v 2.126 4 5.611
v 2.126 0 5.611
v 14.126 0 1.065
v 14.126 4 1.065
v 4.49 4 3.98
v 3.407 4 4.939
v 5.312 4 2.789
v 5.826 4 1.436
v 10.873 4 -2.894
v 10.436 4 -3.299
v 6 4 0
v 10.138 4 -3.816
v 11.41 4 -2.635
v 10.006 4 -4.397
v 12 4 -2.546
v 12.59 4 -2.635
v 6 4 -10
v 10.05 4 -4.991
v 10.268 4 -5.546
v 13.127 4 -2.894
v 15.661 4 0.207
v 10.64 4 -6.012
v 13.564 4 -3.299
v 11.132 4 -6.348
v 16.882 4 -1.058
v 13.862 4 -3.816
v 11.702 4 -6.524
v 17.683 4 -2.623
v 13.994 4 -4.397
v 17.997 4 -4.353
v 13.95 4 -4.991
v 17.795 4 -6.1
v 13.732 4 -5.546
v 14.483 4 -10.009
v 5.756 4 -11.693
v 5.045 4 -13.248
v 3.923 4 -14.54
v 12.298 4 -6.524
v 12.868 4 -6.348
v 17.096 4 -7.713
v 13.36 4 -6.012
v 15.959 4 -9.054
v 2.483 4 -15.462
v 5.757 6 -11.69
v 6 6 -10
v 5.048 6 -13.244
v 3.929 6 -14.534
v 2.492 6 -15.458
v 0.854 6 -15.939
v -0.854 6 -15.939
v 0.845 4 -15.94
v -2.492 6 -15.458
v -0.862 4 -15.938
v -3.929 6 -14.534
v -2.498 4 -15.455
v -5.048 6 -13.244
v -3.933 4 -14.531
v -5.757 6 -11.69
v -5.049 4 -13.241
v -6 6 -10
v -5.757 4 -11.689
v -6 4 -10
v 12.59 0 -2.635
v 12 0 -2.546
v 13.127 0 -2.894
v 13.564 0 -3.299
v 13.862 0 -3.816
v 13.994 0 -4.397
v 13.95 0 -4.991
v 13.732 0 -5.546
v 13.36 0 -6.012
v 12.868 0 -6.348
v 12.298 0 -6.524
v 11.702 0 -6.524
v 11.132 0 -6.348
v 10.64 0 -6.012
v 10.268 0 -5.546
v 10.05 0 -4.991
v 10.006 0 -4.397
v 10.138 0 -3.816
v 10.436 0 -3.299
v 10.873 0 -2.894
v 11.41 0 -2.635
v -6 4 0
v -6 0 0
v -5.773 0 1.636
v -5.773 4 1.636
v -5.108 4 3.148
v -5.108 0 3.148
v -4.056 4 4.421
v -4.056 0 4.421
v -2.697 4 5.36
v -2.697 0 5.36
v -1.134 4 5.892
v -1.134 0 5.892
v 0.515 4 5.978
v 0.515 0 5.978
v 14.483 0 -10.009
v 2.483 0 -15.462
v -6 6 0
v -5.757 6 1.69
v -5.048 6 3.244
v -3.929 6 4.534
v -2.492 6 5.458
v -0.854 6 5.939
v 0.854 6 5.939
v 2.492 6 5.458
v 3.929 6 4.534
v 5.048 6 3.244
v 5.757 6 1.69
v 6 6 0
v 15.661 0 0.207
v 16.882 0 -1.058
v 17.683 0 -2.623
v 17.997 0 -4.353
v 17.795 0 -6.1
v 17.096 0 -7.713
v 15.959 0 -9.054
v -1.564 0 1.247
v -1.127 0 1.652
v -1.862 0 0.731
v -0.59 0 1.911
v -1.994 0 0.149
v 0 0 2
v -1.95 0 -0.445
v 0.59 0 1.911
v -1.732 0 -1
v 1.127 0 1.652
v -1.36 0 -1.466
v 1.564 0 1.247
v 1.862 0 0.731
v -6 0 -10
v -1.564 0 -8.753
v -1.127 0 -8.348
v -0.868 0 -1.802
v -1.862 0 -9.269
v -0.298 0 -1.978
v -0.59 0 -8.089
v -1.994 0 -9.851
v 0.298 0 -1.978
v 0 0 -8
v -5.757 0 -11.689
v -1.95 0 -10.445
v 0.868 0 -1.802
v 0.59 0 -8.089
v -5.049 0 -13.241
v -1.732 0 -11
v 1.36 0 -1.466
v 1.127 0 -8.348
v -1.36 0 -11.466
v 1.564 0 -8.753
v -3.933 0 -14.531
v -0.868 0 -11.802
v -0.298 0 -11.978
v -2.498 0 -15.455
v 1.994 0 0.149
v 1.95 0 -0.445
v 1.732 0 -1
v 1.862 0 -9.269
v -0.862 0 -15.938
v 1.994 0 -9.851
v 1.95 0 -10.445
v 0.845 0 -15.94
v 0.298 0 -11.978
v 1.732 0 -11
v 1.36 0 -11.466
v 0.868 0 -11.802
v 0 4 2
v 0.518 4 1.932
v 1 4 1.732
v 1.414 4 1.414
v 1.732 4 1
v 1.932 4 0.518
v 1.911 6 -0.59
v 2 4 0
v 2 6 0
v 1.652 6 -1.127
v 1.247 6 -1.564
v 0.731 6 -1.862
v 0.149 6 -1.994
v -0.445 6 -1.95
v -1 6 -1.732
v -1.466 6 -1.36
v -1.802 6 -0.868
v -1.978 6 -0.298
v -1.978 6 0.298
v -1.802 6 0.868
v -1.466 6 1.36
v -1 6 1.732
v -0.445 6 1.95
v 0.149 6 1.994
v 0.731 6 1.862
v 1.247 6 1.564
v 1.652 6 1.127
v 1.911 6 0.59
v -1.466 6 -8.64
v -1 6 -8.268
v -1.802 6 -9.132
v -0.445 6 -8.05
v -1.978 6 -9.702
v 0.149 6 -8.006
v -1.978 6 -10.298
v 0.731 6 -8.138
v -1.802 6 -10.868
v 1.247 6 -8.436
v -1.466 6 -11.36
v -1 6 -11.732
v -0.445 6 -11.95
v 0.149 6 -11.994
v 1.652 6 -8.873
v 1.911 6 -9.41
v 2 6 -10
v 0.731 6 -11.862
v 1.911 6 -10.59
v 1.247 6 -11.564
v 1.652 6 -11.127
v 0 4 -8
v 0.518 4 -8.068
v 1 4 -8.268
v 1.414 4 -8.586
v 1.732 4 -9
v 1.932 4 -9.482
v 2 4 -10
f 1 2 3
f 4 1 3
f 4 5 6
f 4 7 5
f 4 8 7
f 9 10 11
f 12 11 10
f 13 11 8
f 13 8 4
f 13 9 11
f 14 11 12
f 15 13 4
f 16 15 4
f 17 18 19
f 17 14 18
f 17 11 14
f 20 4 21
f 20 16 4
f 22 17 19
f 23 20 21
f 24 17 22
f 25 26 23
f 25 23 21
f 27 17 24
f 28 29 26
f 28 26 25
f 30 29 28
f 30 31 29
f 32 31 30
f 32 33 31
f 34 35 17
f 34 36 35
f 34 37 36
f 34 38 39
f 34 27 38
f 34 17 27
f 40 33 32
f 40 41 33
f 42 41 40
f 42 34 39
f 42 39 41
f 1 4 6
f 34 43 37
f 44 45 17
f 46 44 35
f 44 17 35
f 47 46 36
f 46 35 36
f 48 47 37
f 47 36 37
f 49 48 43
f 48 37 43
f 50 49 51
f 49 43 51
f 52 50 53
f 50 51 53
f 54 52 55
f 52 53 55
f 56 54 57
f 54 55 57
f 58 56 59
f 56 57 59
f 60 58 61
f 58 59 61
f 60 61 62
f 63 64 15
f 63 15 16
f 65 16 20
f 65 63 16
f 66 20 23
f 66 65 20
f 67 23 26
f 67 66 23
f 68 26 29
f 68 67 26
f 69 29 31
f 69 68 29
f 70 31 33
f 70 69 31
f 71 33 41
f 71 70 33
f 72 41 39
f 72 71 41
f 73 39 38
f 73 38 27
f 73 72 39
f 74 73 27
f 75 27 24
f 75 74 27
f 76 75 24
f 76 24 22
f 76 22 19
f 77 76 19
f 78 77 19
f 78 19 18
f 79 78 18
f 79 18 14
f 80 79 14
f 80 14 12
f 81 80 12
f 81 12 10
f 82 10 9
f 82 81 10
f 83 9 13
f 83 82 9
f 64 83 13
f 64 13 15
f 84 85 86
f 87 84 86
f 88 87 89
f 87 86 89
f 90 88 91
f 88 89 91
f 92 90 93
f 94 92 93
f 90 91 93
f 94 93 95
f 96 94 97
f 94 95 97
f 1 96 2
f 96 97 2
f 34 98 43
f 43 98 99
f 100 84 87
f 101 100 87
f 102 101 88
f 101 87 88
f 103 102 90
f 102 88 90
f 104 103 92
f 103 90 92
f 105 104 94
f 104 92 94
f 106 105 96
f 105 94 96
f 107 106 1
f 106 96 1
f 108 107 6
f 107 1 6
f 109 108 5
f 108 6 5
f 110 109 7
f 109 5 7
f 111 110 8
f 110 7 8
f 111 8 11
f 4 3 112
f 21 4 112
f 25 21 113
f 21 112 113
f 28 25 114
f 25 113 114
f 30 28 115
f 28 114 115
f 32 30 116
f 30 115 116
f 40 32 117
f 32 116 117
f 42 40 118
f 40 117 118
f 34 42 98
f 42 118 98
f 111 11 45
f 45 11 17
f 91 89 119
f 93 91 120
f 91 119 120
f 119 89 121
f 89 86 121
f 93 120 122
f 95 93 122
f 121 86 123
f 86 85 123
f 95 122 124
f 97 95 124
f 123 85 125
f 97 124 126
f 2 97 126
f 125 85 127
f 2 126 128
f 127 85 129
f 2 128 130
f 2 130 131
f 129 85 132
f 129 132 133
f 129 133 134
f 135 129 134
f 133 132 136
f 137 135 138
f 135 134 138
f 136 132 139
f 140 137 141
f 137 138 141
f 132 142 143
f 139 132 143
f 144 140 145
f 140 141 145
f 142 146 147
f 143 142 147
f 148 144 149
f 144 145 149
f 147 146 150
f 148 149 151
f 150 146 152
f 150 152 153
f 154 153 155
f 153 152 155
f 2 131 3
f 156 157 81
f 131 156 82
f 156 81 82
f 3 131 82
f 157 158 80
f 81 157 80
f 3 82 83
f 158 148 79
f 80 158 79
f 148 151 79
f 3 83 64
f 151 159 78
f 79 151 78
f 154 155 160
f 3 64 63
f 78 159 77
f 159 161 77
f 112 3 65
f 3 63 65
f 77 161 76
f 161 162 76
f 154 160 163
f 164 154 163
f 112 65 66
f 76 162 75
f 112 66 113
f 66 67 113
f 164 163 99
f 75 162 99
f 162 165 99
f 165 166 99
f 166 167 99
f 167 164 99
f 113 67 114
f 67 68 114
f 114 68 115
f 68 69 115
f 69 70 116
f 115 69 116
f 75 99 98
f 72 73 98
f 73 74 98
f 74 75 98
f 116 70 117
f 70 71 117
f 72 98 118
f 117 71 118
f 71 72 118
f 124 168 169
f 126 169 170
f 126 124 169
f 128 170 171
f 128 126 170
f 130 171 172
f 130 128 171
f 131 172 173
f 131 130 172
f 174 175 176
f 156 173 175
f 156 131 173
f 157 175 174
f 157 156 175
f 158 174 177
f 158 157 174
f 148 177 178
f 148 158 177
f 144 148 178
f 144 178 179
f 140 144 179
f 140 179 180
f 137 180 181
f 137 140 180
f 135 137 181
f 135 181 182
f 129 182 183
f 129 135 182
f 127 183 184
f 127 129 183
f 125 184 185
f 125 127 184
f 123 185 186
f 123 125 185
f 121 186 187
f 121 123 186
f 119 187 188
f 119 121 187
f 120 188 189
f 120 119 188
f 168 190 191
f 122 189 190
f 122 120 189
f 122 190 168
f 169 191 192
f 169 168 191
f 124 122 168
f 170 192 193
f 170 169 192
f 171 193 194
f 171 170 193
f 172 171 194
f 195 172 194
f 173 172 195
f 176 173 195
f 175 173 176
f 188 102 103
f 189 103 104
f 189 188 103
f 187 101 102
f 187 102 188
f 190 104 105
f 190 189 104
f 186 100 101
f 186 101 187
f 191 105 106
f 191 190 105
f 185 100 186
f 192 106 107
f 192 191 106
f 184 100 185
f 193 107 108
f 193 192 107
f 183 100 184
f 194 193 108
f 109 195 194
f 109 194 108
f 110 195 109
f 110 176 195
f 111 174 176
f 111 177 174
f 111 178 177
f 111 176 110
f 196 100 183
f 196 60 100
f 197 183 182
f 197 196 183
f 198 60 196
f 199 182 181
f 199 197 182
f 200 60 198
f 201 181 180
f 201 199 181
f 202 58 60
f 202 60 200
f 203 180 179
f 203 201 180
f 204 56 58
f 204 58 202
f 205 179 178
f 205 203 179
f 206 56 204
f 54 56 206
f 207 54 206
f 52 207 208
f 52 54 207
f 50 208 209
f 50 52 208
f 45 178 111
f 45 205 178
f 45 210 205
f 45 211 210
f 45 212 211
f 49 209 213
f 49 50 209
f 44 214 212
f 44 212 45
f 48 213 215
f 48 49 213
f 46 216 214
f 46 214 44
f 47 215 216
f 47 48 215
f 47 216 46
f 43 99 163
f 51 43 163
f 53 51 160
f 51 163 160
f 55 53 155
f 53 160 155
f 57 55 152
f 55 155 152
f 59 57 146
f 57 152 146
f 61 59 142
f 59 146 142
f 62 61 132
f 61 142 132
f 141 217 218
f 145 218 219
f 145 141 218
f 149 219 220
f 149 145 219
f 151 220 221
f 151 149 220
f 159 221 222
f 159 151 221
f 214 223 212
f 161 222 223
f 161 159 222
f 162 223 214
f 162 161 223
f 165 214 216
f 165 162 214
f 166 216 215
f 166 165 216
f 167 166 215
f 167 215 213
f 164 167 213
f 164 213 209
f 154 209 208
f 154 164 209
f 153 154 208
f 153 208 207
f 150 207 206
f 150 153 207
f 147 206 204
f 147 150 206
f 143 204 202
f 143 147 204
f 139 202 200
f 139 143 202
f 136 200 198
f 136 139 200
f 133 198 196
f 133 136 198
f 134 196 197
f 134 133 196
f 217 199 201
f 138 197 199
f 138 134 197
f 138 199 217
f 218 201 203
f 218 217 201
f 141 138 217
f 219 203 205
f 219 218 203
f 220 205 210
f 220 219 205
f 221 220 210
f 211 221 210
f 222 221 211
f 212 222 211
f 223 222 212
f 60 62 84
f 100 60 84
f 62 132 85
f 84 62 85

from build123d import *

# Parameters (mm, degrees)
SKETCH1_R           = 2
BOSS_EXTRUDE1_DEPTH = 4
SKETCH2_R           = 2
BOSS_EXTRUDE2_DEPTH = 2


with BuildPart() as part:
    # Sketch1 → Boss-Extrude1 (new body)
    with BuildSketch(Plane(origin=(0, 0, 0), x_dir=(1, 0, 0), z_dir=(0, 1, 0))):
        with BuildLine():
            Line((2.12569774, -5.610829628), (14.125697613, -1.064554922))
            ThreePointArc((14.125697613, -1.064554922), (17.99688746, 4.353037094), (14.482508262, 10.008614247))
            Line((14.482508262, 10.008614247), (2.482508267, 15.46233949))
            ThreePointArc((2.482508267, 15.46233949), (-3.248457357, 15.044553975), (-6, 10))
            Line((-6, 10), (-6, 0))
            ThreePointArc((-6, 0), (-3.409238446, -4.937316398), (2.12569774, -5.610829628))
        make_face()
        with Locations(Location((0, 0, 0), (0, 0, 270))):
            Circle(SKETCH1_R, mode=Mode.SUBTRACT)
        with Locations(Location((0, 10, 0), (0, 0, 270))):
            Circle(SKETCH1_R, mode=Mode.SUBTRACT)
        with Locations(Location((12, 4.546274754, 0), (0, 0, 270))):
            Circle(SKETCH1_R, mode=Mode.SUBTRACT)
    extrude(amount=BOSS_EXTRUDE1_DEPTH)

    # Sketch2 → Boss-Extrude2 (add)
    with BuildSketch(Plane(origin=(0, 4, 0), x_dir=(1, 0, 0), z_dir=(0, 1, 0))):
        with BuildLine():
            ThreePointArc((6, 10), (0, 16), (-6, 10))
            Line((-6, 10), (-6, 0))
            ThreePointArc((-6, 0), (0, -6), (6, 0))
            Line((6, 0), (6, 10))
        make_face()
        Circle(SKETCH2_R, mode=Mode.SUBTRACT)
        with Locations((0, 10)):
            Circle(SKETCH2_R, mode=Mode.SUBTRACT)
    extrude(amount=BOSS_EXTRUDE2_DEPTH)


solid = part.part
